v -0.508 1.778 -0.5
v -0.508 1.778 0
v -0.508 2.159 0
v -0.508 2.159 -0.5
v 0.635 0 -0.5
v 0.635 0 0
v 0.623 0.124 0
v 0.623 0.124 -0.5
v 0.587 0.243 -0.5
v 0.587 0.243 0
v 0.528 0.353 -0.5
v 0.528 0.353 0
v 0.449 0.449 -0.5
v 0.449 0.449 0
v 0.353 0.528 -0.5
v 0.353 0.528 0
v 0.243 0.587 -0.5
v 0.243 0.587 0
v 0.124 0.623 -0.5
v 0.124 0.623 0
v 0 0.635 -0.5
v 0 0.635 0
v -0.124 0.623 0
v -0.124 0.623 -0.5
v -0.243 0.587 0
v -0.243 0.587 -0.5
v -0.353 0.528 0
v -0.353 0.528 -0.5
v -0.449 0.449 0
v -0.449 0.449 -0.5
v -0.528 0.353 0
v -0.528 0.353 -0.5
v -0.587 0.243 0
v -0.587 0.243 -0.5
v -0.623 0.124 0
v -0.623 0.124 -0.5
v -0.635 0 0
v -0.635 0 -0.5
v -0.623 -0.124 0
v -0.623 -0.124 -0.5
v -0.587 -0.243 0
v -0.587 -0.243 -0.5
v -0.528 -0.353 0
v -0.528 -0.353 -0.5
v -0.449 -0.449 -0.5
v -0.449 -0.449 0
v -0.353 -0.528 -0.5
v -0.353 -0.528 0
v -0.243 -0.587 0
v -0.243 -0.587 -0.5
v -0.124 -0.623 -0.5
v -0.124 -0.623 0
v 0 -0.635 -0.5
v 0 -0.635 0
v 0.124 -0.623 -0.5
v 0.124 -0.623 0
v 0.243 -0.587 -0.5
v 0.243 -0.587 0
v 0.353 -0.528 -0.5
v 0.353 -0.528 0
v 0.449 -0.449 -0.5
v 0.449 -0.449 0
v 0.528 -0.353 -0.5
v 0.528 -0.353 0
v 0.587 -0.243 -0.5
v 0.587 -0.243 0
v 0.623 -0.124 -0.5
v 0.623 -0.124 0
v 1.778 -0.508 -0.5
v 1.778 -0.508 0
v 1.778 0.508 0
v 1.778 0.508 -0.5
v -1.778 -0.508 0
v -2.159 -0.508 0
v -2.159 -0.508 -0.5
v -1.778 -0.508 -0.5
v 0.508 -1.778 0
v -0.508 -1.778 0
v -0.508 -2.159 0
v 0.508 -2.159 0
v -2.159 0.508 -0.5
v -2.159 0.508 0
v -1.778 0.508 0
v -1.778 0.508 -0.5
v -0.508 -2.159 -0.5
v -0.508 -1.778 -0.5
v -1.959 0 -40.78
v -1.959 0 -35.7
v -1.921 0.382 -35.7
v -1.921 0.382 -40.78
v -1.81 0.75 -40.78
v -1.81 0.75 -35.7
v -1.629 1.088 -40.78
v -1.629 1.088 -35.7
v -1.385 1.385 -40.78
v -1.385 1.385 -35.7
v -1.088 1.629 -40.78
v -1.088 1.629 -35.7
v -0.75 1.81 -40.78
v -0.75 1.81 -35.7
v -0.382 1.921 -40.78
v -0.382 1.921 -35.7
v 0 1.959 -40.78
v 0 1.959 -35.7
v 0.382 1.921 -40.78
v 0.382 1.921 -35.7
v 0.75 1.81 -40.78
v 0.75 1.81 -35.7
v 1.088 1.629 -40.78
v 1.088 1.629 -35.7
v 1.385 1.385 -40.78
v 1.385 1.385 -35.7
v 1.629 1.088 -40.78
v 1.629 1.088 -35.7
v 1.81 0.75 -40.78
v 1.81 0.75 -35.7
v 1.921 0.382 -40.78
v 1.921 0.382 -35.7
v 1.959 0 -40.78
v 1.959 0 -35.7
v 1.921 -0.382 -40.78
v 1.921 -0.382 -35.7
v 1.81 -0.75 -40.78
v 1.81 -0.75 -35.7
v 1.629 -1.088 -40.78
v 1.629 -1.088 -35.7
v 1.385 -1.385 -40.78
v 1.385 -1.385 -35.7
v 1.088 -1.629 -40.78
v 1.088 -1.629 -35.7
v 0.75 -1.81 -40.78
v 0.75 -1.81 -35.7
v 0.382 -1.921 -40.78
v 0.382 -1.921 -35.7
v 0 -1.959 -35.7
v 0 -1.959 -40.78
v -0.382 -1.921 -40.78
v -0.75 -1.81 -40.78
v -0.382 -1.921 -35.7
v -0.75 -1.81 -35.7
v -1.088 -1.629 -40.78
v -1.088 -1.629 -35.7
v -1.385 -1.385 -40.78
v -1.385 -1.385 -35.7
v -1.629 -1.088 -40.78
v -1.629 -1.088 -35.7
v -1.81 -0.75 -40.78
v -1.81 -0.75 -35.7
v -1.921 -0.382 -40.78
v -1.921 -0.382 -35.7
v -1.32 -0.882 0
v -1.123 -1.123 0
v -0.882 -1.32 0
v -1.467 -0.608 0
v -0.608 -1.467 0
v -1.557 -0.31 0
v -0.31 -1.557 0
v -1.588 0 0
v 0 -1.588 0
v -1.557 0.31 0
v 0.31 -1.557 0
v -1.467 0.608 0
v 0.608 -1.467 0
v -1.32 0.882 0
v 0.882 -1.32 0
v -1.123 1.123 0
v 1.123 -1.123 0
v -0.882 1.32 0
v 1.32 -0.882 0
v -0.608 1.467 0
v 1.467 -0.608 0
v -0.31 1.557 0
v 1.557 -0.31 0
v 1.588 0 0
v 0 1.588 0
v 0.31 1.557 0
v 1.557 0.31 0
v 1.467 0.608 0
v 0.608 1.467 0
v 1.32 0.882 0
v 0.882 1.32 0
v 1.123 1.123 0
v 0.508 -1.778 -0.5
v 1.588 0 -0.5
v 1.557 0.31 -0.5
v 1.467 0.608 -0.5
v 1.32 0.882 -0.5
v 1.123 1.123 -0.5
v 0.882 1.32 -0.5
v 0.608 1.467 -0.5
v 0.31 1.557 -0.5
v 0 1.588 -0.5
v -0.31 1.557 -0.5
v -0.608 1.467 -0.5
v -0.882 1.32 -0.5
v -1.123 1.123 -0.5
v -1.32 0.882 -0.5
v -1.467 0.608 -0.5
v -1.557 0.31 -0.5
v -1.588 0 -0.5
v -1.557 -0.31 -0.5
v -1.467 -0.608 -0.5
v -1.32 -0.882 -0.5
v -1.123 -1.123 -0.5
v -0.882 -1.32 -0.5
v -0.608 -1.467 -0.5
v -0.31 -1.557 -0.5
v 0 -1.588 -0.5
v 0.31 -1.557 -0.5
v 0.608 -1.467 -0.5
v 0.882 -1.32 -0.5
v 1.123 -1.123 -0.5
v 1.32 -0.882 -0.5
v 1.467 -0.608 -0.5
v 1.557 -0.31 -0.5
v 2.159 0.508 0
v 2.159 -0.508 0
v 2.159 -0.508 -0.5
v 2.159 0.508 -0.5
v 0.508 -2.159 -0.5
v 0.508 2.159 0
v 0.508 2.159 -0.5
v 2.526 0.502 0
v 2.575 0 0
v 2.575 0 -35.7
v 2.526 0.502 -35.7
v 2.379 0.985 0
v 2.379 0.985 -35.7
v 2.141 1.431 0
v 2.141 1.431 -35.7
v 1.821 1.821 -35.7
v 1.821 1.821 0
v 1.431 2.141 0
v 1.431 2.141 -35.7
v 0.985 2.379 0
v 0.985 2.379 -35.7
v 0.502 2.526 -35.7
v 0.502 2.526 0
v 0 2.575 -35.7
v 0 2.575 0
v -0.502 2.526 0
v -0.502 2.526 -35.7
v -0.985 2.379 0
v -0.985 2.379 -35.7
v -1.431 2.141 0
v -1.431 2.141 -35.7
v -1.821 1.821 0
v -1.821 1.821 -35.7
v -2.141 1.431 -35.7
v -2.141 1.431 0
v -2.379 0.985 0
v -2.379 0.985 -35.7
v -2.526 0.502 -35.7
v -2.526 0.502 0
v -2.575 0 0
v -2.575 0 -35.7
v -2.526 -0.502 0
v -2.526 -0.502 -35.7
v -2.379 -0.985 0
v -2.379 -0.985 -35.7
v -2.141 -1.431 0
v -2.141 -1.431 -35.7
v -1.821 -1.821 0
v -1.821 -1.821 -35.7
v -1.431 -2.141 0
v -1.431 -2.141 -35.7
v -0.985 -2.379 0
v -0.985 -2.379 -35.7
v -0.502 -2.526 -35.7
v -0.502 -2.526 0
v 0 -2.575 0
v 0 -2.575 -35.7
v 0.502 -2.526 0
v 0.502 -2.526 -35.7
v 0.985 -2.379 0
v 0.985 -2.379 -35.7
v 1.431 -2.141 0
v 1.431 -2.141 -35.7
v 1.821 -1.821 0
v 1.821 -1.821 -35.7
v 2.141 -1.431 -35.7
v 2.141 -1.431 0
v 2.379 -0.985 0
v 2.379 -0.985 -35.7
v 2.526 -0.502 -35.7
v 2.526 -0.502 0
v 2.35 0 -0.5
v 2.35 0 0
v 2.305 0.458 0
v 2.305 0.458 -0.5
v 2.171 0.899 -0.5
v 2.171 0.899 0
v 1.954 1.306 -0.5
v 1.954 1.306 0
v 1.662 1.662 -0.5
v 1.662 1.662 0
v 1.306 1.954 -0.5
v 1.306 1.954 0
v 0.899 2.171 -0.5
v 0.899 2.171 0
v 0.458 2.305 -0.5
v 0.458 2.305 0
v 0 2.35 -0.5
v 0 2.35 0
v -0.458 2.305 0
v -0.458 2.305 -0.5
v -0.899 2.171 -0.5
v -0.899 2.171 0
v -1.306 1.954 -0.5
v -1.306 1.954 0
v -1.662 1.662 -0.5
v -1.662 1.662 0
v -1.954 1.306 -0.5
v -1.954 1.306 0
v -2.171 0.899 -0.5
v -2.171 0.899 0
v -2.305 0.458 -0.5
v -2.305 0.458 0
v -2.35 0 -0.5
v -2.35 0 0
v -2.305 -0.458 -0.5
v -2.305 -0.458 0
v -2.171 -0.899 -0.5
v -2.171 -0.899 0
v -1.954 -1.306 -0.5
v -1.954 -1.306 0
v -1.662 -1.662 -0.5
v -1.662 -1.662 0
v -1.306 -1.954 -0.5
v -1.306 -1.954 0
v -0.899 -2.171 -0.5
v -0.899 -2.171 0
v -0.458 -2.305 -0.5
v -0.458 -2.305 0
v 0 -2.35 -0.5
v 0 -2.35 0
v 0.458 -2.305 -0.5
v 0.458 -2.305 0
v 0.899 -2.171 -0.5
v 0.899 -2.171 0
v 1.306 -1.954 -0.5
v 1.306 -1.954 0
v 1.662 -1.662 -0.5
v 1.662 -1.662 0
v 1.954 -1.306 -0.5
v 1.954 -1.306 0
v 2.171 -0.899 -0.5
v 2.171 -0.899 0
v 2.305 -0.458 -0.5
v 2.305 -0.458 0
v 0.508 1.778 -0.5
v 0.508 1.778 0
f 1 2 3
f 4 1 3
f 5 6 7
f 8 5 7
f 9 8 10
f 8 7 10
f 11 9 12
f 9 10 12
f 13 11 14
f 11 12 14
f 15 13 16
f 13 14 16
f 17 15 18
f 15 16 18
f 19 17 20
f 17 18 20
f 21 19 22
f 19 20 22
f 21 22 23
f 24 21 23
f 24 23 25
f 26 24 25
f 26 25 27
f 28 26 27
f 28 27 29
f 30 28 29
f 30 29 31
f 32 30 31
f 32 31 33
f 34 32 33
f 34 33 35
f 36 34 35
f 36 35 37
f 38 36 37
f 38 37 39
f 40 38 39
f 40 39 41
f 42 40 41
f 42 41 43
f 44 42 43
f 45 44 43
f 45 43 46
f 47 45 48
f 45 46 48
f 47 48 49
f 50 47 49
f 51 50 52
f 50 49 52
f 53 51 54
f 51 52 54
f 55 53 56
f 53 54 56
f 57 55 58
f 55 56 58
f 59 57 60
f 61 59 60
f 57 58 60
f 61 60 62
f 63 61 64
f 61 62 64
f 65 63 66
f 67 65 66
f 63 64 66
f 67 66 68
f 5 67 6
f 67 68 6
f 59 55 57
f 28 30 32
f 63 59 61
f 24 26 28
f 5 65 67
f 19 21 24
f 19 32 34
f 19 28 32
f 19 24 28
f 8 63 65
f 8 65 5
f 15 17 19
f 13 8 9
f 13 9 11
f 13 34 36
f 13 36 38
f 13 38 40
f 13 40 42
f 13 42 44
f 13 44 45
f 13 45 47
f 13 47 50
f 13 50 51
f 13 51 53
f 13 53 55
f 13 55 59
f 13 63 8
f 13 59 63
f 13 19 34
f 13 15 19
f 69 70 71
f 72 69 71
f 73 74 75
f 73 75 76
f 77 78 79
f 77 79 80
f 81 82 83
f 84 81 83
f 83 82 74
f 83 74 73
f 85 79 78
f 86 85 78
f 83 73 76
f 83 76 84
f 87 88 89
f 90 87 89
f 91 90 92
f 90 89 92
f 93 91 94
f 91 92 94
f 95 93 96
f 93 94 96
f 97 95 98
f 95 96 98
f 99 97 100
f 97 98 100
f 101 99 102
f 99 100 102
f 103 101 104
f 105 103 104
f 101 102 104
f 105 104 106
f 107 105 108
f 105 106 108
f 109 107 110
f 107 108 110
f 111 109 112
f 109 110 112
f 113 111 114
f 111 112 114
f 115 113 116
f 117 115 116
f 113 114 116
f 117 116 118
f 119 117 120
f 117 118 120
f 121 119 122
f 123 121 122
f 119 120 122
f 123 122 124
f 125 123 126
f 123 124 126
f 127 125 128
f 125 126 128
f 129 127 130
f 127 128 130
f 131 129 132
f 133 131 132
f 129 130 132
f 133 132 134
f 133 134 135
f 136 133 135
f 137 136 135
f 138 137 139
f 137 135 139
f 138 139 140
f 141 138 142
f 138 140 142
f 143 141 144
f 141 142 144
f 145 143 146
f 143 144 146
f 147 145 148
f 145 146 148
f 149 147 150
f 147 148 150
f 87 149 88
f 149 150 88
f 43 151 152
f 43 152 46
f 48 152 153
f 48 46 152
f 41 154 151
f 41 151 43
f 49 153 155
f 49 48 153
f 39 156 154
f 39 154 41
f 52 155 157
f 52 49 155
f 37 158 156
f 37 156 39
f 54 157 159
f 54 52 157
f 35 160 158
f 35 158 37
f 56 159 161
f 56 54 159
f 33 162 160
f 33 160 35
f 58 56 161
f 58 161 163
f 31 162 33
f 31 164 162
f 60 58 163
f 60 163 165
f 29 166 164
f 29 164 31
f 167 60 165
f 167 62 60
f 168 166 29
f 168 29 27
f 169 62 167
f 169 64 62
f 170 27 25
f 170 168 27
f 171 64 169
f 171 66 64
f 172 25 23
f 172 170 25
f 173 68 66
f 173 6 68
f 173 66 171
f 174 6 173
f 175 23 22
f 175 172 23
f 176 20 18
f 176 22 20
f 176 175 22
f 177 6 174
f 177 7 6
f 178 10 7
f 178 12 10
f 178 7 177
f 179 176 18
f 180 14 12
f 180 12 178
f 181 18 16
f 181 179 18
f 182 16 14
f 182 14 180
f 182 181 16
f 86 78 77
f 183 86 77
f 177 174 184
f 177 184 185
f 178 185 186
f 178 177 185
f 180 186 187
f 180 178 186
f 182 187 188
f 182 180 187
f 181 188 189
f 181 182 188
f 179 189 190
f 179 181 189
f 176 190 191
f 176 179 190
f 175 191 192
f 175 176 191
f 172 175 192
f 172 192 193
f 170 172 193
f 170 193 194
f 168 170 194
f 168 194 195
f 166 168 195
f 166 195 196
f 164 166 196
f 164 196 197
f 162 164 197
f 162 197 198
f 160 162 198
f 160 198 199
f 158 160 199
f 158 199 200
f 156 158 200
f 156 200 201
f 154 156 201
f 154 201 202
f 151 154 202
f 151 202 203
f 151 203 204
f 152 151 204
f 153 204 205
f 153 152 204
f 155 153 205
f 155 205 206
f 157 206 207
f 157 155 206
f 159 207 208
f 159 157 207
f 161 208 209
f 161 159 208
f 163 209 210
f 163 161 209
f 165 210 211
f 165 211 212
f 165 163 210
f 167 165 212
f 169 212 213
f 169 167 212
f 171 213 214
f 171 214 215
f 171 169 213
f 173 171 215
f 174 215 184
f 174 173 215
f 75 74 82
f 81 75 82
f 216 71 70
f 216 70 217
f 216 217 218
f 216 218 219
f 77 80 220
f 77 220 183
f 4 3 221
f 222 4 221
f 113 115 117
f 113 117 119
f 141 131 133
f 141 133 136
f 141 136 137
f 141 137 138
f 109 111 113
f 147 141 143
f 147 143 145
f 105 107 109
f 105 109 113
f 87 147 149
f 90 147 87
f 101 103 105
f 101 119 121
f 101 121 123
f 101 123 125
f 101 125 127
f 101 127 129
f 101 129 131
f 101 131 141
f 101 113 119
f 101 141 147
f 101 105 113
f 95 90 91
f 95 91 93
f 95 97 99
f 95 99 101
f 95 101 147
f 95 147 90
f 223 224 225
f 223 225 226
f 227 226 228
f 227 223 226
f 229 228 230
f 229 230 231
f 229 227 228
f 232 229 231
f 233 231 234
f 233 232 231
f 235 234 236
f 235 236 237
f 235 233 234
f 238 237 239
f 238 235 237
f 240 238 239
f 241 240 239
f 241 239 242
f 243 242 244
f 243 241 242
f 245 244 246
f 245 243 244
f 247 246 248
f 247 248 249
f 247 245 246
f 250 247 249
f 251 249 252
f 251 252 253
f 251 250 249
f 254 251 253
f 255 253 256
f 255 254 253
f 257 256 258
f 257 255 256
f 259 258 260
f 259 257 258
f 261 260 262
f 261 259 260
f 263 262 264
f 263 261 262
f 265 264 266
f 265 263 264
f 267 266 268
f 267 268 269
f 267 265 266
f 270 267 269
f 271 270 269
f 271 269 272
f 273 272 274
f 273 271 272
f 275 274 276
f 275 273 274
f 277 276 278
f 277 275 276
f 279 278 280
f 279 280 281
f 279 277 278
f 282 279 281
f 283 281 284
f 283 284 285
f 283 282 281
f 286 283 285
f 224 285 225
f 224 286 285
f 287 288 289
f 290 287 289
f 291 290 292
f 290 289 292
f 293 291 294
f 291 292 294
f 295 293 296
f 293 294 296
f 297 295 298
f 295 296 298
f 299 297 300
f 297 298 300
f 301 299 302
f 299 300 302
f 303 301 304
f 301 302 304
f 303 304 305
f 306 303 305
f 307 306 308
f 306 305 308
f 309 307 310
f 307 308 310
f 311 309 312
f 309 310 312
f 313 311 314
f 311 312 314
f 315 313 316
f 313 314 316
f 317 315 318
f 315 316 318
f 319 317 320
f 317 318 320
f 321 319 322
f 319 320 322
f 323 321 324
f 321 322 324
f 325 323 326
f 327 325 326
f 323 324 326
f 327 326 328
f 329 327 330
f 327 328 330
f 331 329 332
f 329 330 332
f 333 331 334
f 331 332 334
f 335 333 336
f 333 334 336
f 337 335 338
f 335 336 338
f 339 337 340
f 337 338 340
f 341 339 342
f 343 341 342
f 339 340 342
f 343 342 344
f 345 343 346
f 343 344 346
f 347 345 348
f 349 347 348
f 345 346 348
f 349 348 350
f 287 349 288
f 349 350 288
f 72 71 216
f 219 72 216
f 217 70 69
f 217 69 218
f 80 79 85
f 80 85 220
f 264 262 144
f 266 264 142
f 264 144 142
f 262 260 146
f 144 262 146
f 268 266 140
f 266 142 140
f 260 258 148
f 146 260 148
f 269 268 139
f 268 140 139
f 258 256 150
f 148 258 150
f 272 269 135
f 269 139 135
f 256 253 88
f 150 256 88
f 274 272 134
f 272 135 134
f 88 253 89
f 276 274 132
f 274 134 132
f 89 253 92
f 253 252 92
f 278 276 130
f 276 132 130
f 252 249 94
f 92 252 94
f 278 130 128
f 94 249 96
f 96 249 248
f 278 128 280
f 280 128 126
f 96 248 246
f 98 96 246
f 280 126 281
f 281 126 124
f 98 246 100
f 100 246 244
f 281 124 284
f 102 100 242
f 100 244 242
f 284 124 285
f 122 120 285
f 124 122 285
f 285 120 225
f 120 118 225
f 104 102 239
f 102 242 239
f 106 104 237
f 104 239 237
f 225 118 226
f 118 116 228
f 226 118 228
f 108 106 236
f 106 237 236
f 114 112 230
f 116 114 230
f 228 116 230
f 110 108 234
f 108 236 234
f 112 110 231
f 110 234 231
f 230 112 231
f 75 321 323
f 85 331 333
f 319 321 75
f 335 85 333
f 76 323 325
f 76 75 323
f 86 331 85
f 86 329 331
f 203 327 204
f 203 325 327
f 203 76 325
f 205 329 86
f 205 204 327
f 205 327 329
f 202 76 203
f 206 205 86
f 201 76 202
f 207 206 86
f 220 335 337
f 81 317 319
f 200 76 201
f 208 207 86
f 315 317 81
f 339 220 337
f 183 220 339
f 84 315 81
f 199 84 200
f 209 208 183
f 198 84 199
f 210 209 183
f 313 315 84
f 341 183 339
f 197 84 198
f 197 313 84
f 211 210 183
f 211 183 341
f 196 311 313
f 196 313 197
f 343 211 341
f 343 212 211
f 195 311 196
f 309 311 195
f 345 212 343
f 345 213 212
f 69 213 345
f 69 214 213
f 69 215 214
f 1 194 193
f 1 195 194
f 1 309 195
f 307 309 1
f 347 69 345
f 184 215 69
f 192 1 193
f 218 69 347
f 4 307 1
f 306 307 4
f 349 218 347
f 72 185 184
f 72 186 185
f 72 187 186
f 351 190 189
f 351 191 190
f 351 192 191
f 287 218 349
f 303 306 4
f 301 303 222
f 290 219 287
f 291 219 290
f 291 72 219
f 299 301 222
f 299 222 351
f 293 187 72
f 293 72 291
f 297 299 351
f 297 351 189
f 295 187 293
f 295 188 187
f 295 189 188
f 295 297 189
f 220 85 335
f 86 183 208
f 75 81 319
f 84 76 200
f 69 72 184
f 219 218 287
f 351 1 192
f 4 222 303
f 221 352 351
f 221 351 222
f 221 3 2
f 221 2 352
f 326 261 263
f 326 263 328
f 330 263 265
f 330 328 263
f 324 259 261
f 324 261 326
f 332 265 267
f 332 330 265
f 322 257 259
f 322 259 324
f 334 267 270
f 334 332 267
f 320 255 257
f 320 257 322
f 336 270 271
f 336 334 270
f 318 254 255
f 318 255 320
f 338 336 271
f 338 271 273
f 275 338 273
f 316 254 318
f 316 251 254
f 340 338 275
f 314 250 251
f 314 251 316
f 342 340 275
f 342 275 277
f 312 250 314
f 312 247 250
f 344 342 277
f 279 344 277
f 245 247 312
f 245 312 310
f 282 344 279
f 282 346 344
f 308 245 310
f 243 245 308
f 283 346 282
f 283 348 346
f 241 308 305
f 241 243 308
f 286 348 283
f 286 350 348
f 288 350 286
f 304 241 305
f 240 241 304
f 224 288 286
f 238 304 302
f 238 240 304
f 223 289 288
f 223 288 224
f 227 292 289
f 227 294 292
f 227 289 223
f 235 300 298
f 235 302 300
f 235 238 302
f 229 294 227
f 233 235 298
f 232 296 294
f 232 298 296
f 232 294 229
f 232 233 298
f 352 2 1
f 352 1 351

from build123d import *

# Parameters (mm, degrees)
SKETCH1_R           = 2.575
BOSS_EXTRUDE1_DEPTH = 35.7
SKETCH2_R           = 2.35
CUT_EXTRUDE1_DEPTH  = 0.5
SKETCH5_R           = 1.5875
SKETCH5_R_2         = 0.635
BOSS_EXTRUDE2_DEPTH = 0.508
SKETCH6_W           = 1.016
SKETCH6_H           = 0.381
SKETCH6_W_2         = 0.381
SKETCH6_H_2         = 1.016
BOSS_EXTRUDE3_DEPTH = 0.508
SKETCH7_R           = 1.9588
BOSS_EXTRUDE4_DEPTH = 5.08


with BuildPart() as part:
    # Sketch1 → Boss-Extrude1 (new body)
    with BuildSketch(Plane.XY):
        Circle(SKETCH1_R)
    extrude(amount=-BOSS_EXTRUDE1_DEPTH)

    # Sketch2 → Cut-Extrude1 (cut)
    with BuildSketch(Plane.XY):
        Circle(SKETCH2_R)
    extrude(amount=-CUT_EXTRUDE1_DEPTH, mode=Mode.SUBTRACT)

    # Sketch5 → Boss-Extrude2 (add)
    with BuildSketch(Plane.XY):
        Circle(SKETCH5_R)
        Circle(SKETCH5_R_2, mode=Mode.SUBTRACT)
    extrude(amount=-BOSS_EXTRUDE2_DEPTH)

    # Sketch6 → Boss-Extrude3 (add)
    with BuildSketch(Plane.XY):
        with Locations((0, 1.9685)):
            Rectangle(SKETCH6_W, SKETCH6_H)
        with Locations((0, -1.9685)):
            Rectangle(SKETCH6_W, SKETCH6_H)
        with Locations((-1.9685, 0)):
            Rectangle(SKETCH6_W_2, SKETCH6_H_2)
        with Locations((1.9685, 0)):
            Rectangle(SKETCH6_W_2, SKETCH6_H_2)
    extrude(amount=-BOSS_EXTRUDE3_DEPTH)

    # Sketch7 → Boss-Extrude4 (add)
    with BuildSketch(Plane(origin=(0, 0, -35.7), x_dir=(-1, 0, 0), z_dir=(0, 0, -1))):
        Circle(SKETCH7_R)
    extrude(amount=BOSS_EXTRUDE4_DEPTH)


solid = part.part
